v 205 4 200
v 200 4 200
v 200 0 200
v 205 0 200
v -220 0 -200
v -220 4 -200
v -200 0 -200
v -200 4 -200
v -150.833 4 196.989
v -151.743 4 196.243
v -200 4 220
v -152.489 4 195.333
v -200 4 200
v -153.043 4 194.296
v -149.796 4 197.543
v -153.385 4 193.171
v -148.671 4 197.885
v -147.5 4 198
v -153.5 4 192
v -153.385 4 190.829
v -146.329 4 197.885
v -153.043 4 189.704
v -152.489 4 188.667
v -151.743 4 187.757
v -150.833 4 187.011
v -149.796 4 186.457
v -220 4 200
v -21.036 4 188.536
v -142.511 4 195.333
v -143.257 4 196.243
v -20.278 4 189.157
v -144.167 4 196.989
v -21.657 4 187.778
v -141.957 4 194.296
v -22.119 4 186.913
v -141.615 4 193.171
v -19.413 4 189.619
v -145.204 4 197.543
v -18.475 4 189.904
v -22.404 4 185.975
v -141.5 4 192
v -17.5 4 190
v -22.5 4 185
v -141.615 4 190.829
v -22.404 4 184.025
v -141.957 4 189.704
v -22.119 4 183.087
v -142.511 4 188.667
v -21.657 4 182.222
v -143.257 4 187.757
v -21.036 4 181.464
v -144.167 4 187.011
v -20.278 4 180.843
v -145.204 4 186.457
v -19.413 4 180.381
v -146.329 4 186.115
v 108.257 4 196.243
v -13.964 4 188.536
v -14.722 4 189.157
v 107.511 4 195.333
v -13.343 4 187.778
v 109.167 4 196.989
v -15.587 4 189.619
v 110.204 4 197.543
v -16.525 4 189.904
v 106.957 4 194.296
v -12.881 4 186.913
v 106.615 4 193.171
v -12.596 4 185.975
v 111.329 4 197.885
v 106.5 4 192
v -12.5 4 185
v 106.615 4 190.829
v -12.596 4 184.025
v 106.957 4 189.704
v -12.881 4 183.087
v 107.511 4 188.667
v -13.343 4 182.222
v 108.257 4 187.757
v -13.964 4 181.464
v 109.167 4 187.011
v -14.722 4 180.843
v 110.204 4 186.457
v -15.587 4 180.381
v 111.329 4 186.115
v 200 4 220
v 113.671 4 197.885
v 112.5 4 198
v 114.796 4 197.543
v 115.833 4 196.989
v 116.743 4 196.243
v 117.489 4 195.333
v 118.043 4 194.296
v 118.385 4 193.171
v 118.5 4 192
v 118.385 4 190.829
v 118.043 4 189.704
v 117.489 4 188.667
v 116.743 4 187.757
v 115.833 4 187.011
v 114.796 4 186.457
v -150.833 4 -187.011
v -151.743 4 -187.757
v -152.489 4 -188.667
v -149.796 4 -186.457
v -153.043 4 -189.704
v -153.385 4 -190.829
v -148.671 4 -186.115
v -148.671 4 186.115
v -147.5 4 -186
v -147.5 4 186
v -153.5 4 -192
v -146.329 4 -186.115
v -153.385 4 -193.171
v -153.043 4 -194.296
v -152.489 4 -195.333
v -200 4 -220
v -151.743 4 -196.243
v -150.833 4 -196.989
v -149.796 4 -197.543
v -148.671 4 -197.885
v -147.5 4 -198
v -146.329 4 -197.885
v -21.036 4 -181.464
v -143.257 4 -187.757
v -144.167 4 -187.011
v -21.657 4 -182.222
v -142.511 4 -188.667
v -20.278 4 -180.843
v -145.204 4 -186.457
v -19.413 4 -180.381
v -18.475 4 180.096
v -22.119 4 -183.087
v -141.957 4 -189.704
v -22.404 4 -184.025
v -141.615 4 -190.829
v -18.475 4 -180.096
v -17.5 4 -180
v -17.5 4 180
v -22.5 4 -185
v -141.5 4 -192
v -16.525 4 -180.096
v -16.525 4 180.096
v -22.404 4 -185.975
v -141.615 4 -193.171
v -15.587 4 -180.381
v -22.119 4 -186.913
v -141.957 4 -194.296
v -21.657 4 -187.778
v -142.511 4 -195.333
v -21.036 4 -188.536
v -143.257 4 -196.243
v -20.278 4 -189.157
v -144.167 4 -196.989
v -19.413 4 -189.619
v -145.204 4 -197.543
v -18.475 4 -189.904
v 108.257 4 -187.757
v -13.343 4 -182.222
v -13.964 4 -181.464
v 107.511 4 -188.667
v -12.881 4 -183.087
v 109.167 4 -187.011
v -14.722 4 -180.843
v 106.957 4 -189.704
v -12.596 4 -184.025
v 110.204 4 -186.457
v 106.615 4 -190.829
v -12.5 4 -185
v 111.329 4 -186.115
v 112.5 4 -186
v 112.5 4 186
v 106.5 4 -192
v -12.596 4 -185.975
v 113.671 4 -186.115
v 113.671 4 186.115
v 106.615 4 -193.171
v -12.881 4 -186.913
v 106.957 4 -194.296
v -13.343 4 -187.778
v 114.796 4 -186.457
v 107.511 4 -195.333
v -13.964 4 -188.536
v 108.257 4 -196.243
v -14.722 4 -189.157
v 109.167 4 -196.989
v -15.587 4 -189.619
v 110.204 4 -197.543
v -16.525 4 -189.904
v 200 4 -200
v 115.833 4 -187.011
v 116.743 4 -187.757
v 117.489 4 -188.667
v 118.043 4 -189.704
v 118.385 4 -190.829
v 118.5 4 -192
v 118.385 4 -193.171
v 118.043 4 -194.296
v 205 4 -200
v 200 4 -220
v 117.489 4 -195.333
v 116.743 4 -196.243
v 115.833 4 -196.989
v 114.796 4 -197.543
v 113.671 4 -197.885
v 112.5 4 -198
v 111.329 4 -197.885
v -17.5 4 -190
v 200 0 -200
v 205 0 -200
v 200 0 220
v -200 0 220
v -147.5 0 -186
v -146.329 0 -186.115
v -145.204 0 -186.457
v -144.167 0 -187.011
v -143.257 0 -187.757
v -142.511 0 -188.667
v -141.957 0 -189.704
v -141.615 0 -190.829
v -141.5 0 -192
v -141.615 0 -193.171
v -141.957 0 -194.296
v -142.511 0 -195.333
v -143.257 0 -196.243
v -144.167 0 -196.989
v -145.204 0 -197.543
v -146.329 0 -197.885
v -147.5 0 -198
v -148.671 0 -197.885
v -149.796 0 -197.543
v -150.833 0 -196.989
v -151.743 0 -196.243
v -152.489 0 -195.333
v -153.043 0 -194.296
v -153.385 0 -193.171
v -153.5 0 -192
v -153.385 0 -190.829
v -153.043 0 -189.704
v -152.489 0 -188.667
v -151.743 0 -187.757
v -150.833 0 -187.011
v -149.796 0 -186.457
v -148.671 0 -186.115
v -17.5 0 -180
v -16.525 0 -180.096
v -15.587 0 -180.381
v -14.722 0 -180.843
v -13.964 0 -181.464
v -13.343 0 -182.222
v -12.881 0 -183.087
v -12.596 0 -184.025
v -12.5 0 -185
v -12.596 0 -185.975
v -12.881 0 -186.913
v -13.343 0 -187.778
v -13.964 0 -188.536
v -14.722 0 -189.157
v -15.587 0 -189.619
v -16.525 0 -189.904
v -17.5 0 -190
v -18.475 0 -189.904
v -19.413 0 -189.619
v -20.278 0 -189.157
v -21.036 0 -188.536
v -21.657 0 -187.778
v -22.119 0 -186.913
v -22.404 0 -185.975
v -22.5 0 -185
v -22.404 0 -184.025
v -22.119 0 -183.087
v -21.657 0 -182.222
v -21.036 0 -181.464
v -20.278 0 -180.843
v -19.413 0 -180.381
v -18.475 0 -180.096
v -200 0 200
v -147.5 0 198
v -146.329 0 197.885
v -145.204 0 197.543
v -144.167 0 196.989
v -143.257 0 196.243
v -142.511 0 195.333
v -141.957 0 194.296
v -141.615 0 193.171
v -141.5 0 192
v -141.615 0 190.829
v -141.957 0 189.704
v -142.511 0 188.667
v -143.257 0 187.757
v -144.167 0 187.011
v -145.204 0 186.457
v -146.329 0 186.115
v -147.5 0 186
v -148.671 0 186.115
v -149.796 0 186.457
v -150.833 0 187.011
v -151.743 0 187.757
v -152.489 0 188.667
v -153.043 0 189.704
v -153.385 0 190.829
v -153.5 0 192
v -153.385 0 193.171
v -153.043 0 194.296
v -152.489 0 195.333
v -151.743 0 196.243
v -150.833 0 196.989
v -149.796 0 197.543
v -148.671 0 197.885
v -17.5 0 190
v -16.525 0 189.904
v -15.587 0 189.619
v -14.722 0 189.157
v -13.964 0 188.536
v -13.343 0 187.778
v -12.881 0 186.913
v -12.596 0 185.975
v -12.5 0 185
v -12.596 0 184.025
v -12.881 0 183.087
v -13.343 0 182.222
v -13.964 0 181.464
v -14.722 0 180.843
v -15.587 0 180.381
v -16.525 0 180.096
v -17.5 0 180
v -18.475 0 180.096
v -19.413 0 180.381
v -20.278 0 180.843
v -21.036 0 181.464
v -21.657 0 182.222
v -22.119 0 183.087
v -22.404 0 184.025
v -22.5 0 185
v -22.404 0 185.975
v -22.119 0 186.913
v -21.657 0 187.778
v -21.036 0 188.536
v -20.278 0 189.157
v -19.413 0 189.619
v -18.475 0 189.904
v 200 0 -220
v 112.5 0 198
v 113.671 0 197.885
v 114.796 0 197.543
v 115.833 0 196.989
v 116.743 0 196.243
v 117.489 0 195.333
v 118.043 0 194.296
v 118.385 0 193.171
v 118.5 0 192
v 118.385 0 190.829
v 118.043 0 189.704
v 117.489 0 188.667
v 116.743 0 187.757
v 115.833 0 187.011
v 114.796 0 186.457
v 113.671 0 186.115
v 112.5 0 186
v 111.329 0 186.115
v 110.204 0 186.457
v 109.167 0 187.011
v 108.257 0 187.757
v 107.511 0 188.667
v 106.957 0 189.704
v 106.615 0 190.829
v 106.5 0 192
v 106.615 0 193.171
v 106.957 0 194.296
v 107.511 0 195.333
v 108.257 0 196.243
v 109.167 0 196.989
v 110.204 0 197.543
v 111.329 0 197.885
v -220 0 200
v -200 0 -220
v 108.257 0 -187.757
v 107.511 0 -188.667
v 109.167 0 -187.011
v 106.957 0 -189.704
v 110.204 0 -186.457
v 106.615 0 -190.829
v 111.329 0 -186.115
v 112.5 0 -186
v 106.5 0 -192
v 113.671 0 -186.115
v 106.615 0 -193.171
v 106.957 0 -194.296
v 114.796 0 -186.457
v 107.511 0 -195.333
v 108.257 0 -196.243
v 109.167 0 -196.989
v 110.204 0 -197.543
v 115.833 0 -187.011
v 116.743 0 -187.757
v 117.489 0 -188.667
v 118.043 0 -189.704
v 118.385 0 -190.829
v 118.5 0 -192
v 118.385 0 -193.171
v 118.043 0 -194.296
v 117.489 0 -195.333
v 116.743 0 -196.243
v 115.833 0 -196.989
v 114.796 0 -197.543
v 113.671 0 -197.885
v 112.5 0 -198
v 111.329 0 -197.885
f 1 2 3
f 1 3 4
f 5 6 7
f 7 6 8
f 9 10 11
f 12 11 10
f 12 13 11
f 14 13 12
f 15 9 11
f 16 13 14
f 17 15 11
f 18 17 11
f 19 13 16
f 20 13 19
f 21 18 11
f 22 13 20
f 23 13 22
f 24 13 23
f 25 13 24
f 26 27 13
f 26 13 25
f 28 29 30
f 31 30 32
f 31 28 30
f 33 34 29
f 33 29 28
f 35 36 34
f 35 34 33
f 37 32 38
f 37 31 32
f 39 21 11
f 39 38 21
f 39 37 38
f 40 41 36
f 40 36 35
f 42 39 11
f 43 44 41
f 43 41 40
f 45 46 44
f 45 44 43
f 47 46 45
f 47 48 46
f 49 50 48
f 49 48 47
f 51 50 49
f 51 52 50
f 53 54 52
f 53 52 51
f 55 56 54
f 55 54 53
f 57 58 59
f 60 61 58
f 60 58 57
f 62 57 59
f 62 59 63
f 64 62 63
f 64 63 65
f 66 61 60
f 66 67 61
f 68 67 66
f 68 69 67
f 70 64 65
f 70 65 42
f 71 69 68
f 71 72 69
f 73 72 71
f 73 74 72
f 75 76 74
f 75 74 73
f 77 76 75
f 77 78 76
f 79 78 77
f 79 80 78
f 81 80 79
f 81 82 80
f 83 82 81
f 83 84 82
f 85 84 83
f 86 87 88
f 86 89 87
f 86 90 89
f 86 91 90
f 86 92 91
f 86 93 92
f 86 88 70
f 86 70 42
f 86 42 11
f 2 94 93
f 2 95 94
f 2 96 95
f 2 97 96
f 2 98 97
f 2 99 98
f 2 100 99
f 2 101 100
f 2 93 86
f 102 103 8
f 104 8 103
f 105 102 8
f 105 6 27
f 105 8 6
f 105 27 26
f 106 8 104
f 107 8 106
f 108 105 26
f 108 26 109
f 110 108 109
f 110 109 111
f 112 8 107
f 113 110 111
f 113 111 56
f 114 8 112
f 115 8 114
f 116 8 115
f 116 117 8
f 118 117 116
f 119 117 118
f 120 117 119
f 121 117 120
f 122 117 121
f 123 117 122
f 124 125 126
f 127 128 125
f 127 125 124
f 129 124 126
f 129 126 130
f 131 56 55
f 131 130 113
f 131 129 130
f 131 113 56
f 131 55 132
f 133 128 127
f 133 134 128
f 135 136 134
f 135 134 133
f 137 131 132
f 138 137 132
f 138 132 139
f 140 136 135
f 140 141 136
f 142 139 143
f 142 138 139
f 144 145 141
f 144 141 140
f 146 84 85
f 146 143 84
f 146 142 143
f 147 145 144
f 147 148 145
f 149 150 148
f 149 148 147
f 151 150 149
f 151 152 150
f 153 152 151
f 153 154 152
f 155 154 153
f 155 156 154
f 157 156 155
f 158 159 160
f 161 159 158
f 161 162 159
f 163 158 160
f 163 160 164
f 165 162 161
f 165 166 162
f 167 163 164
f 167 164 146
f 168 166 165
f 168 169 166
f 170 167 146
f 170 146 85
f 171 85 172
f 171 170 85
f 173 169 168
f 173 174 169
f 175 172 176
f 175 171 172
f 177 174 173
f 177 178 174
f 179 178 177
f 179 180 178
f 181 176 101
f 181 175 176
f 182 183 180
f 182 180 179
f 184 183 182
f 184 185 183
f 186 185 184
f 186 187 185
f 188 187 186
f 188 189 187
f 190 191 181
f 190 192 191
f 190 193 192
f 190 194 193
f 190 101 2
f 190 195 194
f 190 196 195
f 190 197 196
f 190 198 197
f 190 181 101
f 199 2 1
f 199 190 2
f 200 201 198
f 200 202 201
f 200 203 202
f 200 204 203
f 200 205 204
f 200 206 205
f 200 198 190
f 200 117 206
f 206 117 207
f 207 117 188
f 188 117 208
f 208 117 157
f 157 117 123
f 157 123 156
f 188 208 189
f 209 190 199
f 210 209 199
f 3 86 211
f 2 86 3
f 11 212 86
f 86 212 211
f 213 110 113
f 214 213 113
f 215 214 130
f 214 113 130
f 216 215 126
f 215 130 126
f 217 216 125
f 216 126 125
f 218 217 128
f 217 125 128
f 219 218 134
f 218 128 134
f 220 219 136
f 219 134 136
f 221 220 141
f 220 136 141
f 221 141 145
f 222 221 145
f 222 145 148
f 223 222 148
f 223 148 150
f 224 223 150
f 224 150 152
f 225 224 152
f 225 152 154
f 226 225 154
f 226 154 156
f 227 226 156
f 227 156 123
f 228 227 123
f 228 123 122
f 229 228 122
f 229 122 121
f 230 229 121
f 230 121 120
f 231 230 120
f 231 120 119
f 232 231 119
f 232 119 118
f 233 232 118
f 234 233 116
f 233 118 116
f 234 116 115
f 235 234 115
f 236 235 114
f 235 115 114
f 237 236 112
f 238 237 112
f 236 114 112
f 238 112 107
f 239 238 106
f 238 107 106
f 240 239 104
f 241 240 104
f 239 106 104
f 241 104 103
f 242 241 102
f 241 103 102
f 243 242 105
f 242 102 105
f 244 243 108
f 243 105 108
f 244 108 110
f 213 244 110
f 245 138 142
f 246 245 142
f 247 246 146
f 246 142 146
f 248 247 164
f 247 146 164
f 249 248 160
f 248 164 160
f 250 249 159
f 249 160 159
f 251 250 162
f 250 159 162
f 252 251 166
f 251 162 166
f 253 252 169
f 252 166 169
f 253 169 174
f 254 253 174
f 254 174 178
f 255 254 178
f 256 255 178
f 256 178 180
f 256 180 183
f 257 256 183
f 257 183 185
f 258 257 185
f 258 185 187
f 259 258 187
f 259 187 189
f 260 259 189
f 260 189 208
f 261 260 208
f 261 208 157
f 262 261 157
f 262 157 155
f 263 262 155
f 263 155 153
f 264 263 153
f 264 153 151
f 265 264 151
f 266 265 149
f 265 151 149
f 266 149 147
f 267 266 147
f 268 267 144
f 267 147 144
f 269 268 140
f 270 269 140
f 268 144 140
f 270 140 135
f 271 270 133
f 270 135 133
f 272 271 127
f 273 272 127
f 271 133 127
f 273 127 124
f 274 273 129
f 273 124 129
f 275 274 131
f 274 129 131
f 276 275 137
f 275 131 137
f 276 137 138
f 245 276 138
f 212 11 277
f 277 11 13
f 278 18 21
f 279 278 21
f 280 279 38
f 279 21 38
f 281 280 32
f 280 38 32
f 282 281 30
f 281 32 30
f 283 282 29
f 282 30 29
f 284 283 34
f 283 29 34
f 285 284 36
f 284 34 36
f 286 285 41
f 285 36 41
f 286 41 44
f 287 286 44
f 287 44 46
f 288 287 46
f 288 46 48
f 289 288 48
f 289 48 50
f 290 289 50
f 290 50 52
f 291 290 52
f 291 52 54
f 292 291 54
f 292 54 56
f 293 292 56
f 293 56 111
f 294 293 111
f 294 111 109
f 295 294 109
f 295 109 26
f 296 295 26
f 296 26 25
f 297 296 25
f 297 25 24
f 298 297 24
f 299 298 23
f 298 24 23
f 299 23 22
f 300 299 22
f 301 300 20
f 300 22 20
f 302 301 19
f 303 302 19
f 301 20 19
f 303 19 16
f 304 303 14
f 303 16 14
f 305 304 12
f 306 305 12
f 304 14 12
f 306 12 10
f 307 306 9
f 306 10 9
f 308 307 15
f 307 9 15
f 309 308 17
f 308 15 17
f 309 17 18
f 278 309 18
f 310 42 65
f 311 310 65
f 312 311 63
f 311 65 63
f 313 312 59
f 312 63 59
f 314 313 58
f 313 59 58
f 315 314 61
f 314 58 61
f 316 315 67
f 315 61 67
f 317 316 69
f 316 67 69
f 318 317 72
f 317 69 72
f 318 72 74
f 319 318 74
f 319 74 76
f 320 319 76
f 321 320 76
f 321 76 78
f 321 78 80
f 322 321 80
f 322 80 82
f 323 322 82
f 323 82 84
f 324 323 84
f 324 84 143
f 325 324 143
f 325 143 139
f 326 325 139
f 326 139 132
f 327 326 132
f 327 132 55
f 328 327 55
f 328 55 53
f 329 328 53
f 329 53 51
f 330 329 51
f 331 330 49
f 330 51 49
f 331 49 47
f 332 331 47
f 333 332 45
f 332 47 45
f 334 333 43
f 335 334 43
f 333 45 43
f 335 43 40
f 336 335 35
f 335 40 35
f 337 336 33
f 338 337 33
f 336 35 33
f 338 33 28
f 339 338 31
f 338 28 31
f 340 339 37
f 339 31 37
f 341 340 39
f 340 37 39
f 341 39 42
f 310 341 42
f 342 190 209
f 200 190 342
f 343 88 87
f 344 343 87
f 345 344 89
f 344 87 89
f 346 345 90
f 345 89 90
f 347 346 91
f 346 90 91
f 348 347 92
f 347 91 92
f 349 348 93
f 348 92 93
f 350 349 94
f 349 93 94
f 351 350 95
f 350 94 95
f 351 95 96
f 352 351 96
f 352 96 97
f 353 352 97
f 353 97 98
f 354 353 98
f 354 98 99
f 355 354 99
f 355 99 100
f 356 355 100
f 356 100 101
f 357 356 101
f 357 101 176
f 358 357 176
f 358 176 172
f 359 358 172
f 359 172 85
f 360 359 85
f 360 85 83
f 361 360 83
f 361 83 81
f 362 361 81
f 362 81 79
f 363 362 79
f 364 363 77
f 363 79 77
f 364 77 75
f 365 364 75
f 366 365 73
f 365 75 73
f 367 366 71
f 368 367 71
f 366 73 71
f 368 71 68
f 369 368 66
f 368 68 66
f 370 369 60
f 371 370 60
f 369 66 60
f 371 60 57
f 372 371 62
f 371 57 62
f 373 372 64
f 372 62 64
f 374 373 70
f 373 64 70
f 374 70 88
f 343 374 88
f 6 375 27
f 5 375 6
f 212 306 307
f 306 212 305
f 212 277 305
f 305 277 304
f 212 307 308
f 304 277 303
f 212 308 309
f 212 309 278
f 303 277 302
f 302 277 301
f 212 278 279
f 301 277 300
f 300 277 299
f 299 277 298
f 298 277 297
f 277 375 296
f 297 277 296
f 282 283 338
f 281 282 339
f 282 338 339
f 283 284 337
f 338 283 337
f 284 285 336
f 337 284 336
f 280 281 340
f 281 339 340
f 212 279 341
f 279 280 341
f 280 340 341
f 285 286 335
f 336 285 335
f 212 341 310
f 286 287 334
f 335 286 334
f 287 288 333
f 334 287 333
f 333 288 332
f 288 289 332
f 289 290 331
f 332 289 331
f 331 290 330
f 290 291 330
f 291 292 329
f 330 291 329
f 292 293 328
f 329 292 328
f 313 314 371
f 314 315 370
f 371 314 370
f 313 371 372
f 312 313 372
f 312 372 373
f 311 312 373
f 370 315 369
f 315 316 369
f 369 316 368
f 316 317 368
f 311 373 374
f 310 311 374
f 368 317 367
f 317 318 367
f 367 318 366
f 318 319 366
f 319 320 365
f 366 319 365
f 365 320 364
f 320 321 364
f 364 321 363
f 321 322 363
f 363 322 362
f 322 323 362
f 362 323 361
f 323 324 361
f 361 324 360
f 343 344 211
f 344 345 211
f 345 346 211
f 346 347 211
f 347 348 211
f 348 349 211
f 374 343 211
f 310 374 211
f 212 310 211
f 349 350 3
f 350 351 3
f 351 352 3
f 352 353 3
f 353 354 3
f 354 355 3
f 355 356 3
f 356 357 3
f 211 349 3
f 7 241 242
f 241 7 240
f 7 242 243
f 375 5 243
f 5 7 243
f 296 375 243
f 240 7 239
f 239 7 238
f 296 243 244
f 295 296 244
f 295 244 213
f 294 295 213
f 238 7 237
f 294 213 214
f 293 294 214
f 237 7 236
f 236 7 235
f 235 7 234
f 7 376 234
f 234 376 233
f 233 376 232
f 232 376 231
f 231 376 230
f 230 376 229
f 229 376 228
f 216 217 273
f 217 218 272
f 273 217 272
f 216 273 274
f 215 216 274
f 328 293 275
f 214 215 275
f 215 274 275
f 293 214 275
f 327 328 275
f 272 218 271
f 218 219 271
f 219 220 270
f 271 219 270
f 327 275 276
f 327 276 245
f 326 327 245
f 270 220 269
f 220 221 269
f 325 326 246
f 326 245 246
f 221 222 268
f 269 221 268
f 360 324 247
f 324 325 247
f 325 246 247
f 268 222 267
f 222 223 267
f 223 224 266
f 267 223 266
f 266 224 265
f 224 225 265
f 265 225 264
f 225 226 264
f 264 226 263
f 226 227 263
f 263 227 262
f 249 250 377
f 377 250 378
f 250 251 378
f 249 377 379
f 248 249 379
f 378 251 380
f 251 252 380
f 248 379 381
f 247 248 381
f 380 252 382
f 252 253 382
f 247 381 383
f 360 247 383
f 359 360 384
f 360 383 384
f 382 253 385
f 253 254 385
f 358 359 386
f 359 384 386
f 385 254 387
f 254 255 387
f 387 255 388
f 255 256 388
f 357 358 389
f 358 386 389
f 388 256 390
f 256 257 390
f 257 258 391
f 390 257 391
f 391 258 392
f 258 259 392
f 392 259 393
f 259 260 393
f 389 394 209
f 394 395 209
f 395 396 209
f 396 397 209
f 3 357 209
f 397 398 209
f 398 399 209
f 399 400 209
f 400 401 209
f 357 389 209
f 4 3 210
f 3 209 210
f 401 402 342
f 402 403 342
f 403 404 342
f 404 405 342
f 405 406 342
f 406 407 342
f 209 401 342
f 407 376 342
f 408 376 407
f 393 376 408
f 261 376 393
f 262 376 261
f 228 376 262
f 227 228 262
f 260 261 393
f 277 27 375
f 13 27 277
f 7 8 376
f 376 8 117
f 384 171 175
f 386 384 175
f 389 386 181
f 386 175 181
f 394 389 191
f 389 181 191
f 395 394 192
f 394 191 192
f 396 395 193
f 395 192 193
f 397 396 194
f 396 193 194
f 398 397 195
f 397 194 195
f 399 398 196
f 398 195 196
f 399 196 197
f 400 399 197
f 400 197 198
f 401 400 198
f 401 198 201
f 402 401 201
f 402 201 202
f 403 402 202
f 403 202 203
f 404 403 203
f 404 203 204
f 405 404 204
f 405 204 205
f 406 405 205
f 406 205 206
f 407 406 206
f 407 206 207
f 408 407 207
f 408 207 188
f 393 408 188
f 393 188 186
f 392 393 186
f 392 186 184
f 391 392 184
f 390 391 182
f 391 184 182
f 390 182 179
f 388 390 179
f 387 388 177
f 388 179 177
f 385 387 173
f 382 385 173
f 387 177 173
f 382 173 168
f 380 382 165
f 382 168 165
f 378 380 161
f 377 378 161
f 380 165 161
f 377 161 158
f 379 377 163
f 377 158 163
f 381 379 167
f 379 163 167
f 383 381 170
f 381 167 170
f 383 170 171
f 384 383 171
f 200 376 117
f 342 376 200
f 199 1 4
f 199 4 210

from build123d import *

# Parameters (mm, degrees)
SKETCH1_W           = 440
SKETCH1_H           = 440
BOSS_EXTRUDE1_DEPTH = 4
SKETCH3_W           = 20
SKETCH3_H           = 20
CUT_EXTRUDE1_DEPTH  = 10
SKETCH4_R           = 6
SKETCH4_R_2         = 5
CUT_EXTRUDE2_DEPTH  = 10
SKETCH5_W           = 15
SKETCH5_H           = 400
CUT_EXTRUDE3_DEPTH  = 312.152695634


with BuildPart() as part:
    # Sketch1 → Boss-Extrude1 (new body)
    with BuildSketch(Plane(origin=(0, 0, 0), x_dir=(1, 0, 0), z_dir=(0, 1, 0))):
        Rectangle(SKETCH1_W, SKETCH1_H)
    extrude(amount=BOSS_EXTRUDE1_DEPTH)

    # Sketch3 → Cut-Extrude1 (cut)
    with BuildSketch(Plane(origin=(0, 4, 0), x_dir=(1, 0, 0), z_dir=(0, 1, 0))):
        with Locations((-210, -210)):
            Rectangle(SKETCH3_W, SKETCH3_H)
        with Locations((210, -210)):
            Rectangle(SKETCH3_W, SKETCH3_H)
        with Locations((210, 210)):
            Rectangle(SKETCH3_W, SKETCH3_H)
        with Locations((-210, 210)):
            Rectangle(SKETCH3_W, SKETCH3_H)
    extrude(amount=-CUT_EXTRUDE1_DEPTH, mode=Mode.SUBTRACT)

    # Sketch4 → Cut-Extrude2 (cut)
    with BuildSketch(Plane(origin=(0, 4, 0), x_dir=(1, 0, 0), z_dir=(0, 1, 0))):
        with Locations(Location((-147.5, 192, 0), (0, 0, 270))):
            Circle(SKETCH4_R)
        with Locations(Location((112.5, 192, 0), (0, 0, 270))):
            Circle(SKETCH4_R)
        with Locations(Location((-17.5, 185, 0), (0, 0, 270))):
            Circle(SKETCH4_R_2)
        with Locations(Location((112.5, -192, 0), (0, 0, 270))):
            Circle(SKETCH4_R)
        with Locations(Location((-17.5, -185, 0), (0, 0, 270))):
            Circle(SKETCH4_R_2)
        with Locations(Location((-147.5, -192, 0), (0, 0, 270))):
            Circle(SKETCH4_R)
    extrude(amount=-CUT_EXTRUDE2_DEPTH, mode=Mode.SUBTRACT)

    # Sketch5 → Cut-Extrude3 (cut, through all)
    with BuildSketch(Plane(origin=(0, 4, 0), x_dir=(1, 0, 0), z_dir=(0, 1, 0))):
        with Locations((212.5, 0)):
            Rectangle(SKETCH5_W, SKETCH5_H)
    extrude(amount=-CUT_EXTRUDE3_DEPTH, mode=Mode.SUBTRACT)


solid = part.part
